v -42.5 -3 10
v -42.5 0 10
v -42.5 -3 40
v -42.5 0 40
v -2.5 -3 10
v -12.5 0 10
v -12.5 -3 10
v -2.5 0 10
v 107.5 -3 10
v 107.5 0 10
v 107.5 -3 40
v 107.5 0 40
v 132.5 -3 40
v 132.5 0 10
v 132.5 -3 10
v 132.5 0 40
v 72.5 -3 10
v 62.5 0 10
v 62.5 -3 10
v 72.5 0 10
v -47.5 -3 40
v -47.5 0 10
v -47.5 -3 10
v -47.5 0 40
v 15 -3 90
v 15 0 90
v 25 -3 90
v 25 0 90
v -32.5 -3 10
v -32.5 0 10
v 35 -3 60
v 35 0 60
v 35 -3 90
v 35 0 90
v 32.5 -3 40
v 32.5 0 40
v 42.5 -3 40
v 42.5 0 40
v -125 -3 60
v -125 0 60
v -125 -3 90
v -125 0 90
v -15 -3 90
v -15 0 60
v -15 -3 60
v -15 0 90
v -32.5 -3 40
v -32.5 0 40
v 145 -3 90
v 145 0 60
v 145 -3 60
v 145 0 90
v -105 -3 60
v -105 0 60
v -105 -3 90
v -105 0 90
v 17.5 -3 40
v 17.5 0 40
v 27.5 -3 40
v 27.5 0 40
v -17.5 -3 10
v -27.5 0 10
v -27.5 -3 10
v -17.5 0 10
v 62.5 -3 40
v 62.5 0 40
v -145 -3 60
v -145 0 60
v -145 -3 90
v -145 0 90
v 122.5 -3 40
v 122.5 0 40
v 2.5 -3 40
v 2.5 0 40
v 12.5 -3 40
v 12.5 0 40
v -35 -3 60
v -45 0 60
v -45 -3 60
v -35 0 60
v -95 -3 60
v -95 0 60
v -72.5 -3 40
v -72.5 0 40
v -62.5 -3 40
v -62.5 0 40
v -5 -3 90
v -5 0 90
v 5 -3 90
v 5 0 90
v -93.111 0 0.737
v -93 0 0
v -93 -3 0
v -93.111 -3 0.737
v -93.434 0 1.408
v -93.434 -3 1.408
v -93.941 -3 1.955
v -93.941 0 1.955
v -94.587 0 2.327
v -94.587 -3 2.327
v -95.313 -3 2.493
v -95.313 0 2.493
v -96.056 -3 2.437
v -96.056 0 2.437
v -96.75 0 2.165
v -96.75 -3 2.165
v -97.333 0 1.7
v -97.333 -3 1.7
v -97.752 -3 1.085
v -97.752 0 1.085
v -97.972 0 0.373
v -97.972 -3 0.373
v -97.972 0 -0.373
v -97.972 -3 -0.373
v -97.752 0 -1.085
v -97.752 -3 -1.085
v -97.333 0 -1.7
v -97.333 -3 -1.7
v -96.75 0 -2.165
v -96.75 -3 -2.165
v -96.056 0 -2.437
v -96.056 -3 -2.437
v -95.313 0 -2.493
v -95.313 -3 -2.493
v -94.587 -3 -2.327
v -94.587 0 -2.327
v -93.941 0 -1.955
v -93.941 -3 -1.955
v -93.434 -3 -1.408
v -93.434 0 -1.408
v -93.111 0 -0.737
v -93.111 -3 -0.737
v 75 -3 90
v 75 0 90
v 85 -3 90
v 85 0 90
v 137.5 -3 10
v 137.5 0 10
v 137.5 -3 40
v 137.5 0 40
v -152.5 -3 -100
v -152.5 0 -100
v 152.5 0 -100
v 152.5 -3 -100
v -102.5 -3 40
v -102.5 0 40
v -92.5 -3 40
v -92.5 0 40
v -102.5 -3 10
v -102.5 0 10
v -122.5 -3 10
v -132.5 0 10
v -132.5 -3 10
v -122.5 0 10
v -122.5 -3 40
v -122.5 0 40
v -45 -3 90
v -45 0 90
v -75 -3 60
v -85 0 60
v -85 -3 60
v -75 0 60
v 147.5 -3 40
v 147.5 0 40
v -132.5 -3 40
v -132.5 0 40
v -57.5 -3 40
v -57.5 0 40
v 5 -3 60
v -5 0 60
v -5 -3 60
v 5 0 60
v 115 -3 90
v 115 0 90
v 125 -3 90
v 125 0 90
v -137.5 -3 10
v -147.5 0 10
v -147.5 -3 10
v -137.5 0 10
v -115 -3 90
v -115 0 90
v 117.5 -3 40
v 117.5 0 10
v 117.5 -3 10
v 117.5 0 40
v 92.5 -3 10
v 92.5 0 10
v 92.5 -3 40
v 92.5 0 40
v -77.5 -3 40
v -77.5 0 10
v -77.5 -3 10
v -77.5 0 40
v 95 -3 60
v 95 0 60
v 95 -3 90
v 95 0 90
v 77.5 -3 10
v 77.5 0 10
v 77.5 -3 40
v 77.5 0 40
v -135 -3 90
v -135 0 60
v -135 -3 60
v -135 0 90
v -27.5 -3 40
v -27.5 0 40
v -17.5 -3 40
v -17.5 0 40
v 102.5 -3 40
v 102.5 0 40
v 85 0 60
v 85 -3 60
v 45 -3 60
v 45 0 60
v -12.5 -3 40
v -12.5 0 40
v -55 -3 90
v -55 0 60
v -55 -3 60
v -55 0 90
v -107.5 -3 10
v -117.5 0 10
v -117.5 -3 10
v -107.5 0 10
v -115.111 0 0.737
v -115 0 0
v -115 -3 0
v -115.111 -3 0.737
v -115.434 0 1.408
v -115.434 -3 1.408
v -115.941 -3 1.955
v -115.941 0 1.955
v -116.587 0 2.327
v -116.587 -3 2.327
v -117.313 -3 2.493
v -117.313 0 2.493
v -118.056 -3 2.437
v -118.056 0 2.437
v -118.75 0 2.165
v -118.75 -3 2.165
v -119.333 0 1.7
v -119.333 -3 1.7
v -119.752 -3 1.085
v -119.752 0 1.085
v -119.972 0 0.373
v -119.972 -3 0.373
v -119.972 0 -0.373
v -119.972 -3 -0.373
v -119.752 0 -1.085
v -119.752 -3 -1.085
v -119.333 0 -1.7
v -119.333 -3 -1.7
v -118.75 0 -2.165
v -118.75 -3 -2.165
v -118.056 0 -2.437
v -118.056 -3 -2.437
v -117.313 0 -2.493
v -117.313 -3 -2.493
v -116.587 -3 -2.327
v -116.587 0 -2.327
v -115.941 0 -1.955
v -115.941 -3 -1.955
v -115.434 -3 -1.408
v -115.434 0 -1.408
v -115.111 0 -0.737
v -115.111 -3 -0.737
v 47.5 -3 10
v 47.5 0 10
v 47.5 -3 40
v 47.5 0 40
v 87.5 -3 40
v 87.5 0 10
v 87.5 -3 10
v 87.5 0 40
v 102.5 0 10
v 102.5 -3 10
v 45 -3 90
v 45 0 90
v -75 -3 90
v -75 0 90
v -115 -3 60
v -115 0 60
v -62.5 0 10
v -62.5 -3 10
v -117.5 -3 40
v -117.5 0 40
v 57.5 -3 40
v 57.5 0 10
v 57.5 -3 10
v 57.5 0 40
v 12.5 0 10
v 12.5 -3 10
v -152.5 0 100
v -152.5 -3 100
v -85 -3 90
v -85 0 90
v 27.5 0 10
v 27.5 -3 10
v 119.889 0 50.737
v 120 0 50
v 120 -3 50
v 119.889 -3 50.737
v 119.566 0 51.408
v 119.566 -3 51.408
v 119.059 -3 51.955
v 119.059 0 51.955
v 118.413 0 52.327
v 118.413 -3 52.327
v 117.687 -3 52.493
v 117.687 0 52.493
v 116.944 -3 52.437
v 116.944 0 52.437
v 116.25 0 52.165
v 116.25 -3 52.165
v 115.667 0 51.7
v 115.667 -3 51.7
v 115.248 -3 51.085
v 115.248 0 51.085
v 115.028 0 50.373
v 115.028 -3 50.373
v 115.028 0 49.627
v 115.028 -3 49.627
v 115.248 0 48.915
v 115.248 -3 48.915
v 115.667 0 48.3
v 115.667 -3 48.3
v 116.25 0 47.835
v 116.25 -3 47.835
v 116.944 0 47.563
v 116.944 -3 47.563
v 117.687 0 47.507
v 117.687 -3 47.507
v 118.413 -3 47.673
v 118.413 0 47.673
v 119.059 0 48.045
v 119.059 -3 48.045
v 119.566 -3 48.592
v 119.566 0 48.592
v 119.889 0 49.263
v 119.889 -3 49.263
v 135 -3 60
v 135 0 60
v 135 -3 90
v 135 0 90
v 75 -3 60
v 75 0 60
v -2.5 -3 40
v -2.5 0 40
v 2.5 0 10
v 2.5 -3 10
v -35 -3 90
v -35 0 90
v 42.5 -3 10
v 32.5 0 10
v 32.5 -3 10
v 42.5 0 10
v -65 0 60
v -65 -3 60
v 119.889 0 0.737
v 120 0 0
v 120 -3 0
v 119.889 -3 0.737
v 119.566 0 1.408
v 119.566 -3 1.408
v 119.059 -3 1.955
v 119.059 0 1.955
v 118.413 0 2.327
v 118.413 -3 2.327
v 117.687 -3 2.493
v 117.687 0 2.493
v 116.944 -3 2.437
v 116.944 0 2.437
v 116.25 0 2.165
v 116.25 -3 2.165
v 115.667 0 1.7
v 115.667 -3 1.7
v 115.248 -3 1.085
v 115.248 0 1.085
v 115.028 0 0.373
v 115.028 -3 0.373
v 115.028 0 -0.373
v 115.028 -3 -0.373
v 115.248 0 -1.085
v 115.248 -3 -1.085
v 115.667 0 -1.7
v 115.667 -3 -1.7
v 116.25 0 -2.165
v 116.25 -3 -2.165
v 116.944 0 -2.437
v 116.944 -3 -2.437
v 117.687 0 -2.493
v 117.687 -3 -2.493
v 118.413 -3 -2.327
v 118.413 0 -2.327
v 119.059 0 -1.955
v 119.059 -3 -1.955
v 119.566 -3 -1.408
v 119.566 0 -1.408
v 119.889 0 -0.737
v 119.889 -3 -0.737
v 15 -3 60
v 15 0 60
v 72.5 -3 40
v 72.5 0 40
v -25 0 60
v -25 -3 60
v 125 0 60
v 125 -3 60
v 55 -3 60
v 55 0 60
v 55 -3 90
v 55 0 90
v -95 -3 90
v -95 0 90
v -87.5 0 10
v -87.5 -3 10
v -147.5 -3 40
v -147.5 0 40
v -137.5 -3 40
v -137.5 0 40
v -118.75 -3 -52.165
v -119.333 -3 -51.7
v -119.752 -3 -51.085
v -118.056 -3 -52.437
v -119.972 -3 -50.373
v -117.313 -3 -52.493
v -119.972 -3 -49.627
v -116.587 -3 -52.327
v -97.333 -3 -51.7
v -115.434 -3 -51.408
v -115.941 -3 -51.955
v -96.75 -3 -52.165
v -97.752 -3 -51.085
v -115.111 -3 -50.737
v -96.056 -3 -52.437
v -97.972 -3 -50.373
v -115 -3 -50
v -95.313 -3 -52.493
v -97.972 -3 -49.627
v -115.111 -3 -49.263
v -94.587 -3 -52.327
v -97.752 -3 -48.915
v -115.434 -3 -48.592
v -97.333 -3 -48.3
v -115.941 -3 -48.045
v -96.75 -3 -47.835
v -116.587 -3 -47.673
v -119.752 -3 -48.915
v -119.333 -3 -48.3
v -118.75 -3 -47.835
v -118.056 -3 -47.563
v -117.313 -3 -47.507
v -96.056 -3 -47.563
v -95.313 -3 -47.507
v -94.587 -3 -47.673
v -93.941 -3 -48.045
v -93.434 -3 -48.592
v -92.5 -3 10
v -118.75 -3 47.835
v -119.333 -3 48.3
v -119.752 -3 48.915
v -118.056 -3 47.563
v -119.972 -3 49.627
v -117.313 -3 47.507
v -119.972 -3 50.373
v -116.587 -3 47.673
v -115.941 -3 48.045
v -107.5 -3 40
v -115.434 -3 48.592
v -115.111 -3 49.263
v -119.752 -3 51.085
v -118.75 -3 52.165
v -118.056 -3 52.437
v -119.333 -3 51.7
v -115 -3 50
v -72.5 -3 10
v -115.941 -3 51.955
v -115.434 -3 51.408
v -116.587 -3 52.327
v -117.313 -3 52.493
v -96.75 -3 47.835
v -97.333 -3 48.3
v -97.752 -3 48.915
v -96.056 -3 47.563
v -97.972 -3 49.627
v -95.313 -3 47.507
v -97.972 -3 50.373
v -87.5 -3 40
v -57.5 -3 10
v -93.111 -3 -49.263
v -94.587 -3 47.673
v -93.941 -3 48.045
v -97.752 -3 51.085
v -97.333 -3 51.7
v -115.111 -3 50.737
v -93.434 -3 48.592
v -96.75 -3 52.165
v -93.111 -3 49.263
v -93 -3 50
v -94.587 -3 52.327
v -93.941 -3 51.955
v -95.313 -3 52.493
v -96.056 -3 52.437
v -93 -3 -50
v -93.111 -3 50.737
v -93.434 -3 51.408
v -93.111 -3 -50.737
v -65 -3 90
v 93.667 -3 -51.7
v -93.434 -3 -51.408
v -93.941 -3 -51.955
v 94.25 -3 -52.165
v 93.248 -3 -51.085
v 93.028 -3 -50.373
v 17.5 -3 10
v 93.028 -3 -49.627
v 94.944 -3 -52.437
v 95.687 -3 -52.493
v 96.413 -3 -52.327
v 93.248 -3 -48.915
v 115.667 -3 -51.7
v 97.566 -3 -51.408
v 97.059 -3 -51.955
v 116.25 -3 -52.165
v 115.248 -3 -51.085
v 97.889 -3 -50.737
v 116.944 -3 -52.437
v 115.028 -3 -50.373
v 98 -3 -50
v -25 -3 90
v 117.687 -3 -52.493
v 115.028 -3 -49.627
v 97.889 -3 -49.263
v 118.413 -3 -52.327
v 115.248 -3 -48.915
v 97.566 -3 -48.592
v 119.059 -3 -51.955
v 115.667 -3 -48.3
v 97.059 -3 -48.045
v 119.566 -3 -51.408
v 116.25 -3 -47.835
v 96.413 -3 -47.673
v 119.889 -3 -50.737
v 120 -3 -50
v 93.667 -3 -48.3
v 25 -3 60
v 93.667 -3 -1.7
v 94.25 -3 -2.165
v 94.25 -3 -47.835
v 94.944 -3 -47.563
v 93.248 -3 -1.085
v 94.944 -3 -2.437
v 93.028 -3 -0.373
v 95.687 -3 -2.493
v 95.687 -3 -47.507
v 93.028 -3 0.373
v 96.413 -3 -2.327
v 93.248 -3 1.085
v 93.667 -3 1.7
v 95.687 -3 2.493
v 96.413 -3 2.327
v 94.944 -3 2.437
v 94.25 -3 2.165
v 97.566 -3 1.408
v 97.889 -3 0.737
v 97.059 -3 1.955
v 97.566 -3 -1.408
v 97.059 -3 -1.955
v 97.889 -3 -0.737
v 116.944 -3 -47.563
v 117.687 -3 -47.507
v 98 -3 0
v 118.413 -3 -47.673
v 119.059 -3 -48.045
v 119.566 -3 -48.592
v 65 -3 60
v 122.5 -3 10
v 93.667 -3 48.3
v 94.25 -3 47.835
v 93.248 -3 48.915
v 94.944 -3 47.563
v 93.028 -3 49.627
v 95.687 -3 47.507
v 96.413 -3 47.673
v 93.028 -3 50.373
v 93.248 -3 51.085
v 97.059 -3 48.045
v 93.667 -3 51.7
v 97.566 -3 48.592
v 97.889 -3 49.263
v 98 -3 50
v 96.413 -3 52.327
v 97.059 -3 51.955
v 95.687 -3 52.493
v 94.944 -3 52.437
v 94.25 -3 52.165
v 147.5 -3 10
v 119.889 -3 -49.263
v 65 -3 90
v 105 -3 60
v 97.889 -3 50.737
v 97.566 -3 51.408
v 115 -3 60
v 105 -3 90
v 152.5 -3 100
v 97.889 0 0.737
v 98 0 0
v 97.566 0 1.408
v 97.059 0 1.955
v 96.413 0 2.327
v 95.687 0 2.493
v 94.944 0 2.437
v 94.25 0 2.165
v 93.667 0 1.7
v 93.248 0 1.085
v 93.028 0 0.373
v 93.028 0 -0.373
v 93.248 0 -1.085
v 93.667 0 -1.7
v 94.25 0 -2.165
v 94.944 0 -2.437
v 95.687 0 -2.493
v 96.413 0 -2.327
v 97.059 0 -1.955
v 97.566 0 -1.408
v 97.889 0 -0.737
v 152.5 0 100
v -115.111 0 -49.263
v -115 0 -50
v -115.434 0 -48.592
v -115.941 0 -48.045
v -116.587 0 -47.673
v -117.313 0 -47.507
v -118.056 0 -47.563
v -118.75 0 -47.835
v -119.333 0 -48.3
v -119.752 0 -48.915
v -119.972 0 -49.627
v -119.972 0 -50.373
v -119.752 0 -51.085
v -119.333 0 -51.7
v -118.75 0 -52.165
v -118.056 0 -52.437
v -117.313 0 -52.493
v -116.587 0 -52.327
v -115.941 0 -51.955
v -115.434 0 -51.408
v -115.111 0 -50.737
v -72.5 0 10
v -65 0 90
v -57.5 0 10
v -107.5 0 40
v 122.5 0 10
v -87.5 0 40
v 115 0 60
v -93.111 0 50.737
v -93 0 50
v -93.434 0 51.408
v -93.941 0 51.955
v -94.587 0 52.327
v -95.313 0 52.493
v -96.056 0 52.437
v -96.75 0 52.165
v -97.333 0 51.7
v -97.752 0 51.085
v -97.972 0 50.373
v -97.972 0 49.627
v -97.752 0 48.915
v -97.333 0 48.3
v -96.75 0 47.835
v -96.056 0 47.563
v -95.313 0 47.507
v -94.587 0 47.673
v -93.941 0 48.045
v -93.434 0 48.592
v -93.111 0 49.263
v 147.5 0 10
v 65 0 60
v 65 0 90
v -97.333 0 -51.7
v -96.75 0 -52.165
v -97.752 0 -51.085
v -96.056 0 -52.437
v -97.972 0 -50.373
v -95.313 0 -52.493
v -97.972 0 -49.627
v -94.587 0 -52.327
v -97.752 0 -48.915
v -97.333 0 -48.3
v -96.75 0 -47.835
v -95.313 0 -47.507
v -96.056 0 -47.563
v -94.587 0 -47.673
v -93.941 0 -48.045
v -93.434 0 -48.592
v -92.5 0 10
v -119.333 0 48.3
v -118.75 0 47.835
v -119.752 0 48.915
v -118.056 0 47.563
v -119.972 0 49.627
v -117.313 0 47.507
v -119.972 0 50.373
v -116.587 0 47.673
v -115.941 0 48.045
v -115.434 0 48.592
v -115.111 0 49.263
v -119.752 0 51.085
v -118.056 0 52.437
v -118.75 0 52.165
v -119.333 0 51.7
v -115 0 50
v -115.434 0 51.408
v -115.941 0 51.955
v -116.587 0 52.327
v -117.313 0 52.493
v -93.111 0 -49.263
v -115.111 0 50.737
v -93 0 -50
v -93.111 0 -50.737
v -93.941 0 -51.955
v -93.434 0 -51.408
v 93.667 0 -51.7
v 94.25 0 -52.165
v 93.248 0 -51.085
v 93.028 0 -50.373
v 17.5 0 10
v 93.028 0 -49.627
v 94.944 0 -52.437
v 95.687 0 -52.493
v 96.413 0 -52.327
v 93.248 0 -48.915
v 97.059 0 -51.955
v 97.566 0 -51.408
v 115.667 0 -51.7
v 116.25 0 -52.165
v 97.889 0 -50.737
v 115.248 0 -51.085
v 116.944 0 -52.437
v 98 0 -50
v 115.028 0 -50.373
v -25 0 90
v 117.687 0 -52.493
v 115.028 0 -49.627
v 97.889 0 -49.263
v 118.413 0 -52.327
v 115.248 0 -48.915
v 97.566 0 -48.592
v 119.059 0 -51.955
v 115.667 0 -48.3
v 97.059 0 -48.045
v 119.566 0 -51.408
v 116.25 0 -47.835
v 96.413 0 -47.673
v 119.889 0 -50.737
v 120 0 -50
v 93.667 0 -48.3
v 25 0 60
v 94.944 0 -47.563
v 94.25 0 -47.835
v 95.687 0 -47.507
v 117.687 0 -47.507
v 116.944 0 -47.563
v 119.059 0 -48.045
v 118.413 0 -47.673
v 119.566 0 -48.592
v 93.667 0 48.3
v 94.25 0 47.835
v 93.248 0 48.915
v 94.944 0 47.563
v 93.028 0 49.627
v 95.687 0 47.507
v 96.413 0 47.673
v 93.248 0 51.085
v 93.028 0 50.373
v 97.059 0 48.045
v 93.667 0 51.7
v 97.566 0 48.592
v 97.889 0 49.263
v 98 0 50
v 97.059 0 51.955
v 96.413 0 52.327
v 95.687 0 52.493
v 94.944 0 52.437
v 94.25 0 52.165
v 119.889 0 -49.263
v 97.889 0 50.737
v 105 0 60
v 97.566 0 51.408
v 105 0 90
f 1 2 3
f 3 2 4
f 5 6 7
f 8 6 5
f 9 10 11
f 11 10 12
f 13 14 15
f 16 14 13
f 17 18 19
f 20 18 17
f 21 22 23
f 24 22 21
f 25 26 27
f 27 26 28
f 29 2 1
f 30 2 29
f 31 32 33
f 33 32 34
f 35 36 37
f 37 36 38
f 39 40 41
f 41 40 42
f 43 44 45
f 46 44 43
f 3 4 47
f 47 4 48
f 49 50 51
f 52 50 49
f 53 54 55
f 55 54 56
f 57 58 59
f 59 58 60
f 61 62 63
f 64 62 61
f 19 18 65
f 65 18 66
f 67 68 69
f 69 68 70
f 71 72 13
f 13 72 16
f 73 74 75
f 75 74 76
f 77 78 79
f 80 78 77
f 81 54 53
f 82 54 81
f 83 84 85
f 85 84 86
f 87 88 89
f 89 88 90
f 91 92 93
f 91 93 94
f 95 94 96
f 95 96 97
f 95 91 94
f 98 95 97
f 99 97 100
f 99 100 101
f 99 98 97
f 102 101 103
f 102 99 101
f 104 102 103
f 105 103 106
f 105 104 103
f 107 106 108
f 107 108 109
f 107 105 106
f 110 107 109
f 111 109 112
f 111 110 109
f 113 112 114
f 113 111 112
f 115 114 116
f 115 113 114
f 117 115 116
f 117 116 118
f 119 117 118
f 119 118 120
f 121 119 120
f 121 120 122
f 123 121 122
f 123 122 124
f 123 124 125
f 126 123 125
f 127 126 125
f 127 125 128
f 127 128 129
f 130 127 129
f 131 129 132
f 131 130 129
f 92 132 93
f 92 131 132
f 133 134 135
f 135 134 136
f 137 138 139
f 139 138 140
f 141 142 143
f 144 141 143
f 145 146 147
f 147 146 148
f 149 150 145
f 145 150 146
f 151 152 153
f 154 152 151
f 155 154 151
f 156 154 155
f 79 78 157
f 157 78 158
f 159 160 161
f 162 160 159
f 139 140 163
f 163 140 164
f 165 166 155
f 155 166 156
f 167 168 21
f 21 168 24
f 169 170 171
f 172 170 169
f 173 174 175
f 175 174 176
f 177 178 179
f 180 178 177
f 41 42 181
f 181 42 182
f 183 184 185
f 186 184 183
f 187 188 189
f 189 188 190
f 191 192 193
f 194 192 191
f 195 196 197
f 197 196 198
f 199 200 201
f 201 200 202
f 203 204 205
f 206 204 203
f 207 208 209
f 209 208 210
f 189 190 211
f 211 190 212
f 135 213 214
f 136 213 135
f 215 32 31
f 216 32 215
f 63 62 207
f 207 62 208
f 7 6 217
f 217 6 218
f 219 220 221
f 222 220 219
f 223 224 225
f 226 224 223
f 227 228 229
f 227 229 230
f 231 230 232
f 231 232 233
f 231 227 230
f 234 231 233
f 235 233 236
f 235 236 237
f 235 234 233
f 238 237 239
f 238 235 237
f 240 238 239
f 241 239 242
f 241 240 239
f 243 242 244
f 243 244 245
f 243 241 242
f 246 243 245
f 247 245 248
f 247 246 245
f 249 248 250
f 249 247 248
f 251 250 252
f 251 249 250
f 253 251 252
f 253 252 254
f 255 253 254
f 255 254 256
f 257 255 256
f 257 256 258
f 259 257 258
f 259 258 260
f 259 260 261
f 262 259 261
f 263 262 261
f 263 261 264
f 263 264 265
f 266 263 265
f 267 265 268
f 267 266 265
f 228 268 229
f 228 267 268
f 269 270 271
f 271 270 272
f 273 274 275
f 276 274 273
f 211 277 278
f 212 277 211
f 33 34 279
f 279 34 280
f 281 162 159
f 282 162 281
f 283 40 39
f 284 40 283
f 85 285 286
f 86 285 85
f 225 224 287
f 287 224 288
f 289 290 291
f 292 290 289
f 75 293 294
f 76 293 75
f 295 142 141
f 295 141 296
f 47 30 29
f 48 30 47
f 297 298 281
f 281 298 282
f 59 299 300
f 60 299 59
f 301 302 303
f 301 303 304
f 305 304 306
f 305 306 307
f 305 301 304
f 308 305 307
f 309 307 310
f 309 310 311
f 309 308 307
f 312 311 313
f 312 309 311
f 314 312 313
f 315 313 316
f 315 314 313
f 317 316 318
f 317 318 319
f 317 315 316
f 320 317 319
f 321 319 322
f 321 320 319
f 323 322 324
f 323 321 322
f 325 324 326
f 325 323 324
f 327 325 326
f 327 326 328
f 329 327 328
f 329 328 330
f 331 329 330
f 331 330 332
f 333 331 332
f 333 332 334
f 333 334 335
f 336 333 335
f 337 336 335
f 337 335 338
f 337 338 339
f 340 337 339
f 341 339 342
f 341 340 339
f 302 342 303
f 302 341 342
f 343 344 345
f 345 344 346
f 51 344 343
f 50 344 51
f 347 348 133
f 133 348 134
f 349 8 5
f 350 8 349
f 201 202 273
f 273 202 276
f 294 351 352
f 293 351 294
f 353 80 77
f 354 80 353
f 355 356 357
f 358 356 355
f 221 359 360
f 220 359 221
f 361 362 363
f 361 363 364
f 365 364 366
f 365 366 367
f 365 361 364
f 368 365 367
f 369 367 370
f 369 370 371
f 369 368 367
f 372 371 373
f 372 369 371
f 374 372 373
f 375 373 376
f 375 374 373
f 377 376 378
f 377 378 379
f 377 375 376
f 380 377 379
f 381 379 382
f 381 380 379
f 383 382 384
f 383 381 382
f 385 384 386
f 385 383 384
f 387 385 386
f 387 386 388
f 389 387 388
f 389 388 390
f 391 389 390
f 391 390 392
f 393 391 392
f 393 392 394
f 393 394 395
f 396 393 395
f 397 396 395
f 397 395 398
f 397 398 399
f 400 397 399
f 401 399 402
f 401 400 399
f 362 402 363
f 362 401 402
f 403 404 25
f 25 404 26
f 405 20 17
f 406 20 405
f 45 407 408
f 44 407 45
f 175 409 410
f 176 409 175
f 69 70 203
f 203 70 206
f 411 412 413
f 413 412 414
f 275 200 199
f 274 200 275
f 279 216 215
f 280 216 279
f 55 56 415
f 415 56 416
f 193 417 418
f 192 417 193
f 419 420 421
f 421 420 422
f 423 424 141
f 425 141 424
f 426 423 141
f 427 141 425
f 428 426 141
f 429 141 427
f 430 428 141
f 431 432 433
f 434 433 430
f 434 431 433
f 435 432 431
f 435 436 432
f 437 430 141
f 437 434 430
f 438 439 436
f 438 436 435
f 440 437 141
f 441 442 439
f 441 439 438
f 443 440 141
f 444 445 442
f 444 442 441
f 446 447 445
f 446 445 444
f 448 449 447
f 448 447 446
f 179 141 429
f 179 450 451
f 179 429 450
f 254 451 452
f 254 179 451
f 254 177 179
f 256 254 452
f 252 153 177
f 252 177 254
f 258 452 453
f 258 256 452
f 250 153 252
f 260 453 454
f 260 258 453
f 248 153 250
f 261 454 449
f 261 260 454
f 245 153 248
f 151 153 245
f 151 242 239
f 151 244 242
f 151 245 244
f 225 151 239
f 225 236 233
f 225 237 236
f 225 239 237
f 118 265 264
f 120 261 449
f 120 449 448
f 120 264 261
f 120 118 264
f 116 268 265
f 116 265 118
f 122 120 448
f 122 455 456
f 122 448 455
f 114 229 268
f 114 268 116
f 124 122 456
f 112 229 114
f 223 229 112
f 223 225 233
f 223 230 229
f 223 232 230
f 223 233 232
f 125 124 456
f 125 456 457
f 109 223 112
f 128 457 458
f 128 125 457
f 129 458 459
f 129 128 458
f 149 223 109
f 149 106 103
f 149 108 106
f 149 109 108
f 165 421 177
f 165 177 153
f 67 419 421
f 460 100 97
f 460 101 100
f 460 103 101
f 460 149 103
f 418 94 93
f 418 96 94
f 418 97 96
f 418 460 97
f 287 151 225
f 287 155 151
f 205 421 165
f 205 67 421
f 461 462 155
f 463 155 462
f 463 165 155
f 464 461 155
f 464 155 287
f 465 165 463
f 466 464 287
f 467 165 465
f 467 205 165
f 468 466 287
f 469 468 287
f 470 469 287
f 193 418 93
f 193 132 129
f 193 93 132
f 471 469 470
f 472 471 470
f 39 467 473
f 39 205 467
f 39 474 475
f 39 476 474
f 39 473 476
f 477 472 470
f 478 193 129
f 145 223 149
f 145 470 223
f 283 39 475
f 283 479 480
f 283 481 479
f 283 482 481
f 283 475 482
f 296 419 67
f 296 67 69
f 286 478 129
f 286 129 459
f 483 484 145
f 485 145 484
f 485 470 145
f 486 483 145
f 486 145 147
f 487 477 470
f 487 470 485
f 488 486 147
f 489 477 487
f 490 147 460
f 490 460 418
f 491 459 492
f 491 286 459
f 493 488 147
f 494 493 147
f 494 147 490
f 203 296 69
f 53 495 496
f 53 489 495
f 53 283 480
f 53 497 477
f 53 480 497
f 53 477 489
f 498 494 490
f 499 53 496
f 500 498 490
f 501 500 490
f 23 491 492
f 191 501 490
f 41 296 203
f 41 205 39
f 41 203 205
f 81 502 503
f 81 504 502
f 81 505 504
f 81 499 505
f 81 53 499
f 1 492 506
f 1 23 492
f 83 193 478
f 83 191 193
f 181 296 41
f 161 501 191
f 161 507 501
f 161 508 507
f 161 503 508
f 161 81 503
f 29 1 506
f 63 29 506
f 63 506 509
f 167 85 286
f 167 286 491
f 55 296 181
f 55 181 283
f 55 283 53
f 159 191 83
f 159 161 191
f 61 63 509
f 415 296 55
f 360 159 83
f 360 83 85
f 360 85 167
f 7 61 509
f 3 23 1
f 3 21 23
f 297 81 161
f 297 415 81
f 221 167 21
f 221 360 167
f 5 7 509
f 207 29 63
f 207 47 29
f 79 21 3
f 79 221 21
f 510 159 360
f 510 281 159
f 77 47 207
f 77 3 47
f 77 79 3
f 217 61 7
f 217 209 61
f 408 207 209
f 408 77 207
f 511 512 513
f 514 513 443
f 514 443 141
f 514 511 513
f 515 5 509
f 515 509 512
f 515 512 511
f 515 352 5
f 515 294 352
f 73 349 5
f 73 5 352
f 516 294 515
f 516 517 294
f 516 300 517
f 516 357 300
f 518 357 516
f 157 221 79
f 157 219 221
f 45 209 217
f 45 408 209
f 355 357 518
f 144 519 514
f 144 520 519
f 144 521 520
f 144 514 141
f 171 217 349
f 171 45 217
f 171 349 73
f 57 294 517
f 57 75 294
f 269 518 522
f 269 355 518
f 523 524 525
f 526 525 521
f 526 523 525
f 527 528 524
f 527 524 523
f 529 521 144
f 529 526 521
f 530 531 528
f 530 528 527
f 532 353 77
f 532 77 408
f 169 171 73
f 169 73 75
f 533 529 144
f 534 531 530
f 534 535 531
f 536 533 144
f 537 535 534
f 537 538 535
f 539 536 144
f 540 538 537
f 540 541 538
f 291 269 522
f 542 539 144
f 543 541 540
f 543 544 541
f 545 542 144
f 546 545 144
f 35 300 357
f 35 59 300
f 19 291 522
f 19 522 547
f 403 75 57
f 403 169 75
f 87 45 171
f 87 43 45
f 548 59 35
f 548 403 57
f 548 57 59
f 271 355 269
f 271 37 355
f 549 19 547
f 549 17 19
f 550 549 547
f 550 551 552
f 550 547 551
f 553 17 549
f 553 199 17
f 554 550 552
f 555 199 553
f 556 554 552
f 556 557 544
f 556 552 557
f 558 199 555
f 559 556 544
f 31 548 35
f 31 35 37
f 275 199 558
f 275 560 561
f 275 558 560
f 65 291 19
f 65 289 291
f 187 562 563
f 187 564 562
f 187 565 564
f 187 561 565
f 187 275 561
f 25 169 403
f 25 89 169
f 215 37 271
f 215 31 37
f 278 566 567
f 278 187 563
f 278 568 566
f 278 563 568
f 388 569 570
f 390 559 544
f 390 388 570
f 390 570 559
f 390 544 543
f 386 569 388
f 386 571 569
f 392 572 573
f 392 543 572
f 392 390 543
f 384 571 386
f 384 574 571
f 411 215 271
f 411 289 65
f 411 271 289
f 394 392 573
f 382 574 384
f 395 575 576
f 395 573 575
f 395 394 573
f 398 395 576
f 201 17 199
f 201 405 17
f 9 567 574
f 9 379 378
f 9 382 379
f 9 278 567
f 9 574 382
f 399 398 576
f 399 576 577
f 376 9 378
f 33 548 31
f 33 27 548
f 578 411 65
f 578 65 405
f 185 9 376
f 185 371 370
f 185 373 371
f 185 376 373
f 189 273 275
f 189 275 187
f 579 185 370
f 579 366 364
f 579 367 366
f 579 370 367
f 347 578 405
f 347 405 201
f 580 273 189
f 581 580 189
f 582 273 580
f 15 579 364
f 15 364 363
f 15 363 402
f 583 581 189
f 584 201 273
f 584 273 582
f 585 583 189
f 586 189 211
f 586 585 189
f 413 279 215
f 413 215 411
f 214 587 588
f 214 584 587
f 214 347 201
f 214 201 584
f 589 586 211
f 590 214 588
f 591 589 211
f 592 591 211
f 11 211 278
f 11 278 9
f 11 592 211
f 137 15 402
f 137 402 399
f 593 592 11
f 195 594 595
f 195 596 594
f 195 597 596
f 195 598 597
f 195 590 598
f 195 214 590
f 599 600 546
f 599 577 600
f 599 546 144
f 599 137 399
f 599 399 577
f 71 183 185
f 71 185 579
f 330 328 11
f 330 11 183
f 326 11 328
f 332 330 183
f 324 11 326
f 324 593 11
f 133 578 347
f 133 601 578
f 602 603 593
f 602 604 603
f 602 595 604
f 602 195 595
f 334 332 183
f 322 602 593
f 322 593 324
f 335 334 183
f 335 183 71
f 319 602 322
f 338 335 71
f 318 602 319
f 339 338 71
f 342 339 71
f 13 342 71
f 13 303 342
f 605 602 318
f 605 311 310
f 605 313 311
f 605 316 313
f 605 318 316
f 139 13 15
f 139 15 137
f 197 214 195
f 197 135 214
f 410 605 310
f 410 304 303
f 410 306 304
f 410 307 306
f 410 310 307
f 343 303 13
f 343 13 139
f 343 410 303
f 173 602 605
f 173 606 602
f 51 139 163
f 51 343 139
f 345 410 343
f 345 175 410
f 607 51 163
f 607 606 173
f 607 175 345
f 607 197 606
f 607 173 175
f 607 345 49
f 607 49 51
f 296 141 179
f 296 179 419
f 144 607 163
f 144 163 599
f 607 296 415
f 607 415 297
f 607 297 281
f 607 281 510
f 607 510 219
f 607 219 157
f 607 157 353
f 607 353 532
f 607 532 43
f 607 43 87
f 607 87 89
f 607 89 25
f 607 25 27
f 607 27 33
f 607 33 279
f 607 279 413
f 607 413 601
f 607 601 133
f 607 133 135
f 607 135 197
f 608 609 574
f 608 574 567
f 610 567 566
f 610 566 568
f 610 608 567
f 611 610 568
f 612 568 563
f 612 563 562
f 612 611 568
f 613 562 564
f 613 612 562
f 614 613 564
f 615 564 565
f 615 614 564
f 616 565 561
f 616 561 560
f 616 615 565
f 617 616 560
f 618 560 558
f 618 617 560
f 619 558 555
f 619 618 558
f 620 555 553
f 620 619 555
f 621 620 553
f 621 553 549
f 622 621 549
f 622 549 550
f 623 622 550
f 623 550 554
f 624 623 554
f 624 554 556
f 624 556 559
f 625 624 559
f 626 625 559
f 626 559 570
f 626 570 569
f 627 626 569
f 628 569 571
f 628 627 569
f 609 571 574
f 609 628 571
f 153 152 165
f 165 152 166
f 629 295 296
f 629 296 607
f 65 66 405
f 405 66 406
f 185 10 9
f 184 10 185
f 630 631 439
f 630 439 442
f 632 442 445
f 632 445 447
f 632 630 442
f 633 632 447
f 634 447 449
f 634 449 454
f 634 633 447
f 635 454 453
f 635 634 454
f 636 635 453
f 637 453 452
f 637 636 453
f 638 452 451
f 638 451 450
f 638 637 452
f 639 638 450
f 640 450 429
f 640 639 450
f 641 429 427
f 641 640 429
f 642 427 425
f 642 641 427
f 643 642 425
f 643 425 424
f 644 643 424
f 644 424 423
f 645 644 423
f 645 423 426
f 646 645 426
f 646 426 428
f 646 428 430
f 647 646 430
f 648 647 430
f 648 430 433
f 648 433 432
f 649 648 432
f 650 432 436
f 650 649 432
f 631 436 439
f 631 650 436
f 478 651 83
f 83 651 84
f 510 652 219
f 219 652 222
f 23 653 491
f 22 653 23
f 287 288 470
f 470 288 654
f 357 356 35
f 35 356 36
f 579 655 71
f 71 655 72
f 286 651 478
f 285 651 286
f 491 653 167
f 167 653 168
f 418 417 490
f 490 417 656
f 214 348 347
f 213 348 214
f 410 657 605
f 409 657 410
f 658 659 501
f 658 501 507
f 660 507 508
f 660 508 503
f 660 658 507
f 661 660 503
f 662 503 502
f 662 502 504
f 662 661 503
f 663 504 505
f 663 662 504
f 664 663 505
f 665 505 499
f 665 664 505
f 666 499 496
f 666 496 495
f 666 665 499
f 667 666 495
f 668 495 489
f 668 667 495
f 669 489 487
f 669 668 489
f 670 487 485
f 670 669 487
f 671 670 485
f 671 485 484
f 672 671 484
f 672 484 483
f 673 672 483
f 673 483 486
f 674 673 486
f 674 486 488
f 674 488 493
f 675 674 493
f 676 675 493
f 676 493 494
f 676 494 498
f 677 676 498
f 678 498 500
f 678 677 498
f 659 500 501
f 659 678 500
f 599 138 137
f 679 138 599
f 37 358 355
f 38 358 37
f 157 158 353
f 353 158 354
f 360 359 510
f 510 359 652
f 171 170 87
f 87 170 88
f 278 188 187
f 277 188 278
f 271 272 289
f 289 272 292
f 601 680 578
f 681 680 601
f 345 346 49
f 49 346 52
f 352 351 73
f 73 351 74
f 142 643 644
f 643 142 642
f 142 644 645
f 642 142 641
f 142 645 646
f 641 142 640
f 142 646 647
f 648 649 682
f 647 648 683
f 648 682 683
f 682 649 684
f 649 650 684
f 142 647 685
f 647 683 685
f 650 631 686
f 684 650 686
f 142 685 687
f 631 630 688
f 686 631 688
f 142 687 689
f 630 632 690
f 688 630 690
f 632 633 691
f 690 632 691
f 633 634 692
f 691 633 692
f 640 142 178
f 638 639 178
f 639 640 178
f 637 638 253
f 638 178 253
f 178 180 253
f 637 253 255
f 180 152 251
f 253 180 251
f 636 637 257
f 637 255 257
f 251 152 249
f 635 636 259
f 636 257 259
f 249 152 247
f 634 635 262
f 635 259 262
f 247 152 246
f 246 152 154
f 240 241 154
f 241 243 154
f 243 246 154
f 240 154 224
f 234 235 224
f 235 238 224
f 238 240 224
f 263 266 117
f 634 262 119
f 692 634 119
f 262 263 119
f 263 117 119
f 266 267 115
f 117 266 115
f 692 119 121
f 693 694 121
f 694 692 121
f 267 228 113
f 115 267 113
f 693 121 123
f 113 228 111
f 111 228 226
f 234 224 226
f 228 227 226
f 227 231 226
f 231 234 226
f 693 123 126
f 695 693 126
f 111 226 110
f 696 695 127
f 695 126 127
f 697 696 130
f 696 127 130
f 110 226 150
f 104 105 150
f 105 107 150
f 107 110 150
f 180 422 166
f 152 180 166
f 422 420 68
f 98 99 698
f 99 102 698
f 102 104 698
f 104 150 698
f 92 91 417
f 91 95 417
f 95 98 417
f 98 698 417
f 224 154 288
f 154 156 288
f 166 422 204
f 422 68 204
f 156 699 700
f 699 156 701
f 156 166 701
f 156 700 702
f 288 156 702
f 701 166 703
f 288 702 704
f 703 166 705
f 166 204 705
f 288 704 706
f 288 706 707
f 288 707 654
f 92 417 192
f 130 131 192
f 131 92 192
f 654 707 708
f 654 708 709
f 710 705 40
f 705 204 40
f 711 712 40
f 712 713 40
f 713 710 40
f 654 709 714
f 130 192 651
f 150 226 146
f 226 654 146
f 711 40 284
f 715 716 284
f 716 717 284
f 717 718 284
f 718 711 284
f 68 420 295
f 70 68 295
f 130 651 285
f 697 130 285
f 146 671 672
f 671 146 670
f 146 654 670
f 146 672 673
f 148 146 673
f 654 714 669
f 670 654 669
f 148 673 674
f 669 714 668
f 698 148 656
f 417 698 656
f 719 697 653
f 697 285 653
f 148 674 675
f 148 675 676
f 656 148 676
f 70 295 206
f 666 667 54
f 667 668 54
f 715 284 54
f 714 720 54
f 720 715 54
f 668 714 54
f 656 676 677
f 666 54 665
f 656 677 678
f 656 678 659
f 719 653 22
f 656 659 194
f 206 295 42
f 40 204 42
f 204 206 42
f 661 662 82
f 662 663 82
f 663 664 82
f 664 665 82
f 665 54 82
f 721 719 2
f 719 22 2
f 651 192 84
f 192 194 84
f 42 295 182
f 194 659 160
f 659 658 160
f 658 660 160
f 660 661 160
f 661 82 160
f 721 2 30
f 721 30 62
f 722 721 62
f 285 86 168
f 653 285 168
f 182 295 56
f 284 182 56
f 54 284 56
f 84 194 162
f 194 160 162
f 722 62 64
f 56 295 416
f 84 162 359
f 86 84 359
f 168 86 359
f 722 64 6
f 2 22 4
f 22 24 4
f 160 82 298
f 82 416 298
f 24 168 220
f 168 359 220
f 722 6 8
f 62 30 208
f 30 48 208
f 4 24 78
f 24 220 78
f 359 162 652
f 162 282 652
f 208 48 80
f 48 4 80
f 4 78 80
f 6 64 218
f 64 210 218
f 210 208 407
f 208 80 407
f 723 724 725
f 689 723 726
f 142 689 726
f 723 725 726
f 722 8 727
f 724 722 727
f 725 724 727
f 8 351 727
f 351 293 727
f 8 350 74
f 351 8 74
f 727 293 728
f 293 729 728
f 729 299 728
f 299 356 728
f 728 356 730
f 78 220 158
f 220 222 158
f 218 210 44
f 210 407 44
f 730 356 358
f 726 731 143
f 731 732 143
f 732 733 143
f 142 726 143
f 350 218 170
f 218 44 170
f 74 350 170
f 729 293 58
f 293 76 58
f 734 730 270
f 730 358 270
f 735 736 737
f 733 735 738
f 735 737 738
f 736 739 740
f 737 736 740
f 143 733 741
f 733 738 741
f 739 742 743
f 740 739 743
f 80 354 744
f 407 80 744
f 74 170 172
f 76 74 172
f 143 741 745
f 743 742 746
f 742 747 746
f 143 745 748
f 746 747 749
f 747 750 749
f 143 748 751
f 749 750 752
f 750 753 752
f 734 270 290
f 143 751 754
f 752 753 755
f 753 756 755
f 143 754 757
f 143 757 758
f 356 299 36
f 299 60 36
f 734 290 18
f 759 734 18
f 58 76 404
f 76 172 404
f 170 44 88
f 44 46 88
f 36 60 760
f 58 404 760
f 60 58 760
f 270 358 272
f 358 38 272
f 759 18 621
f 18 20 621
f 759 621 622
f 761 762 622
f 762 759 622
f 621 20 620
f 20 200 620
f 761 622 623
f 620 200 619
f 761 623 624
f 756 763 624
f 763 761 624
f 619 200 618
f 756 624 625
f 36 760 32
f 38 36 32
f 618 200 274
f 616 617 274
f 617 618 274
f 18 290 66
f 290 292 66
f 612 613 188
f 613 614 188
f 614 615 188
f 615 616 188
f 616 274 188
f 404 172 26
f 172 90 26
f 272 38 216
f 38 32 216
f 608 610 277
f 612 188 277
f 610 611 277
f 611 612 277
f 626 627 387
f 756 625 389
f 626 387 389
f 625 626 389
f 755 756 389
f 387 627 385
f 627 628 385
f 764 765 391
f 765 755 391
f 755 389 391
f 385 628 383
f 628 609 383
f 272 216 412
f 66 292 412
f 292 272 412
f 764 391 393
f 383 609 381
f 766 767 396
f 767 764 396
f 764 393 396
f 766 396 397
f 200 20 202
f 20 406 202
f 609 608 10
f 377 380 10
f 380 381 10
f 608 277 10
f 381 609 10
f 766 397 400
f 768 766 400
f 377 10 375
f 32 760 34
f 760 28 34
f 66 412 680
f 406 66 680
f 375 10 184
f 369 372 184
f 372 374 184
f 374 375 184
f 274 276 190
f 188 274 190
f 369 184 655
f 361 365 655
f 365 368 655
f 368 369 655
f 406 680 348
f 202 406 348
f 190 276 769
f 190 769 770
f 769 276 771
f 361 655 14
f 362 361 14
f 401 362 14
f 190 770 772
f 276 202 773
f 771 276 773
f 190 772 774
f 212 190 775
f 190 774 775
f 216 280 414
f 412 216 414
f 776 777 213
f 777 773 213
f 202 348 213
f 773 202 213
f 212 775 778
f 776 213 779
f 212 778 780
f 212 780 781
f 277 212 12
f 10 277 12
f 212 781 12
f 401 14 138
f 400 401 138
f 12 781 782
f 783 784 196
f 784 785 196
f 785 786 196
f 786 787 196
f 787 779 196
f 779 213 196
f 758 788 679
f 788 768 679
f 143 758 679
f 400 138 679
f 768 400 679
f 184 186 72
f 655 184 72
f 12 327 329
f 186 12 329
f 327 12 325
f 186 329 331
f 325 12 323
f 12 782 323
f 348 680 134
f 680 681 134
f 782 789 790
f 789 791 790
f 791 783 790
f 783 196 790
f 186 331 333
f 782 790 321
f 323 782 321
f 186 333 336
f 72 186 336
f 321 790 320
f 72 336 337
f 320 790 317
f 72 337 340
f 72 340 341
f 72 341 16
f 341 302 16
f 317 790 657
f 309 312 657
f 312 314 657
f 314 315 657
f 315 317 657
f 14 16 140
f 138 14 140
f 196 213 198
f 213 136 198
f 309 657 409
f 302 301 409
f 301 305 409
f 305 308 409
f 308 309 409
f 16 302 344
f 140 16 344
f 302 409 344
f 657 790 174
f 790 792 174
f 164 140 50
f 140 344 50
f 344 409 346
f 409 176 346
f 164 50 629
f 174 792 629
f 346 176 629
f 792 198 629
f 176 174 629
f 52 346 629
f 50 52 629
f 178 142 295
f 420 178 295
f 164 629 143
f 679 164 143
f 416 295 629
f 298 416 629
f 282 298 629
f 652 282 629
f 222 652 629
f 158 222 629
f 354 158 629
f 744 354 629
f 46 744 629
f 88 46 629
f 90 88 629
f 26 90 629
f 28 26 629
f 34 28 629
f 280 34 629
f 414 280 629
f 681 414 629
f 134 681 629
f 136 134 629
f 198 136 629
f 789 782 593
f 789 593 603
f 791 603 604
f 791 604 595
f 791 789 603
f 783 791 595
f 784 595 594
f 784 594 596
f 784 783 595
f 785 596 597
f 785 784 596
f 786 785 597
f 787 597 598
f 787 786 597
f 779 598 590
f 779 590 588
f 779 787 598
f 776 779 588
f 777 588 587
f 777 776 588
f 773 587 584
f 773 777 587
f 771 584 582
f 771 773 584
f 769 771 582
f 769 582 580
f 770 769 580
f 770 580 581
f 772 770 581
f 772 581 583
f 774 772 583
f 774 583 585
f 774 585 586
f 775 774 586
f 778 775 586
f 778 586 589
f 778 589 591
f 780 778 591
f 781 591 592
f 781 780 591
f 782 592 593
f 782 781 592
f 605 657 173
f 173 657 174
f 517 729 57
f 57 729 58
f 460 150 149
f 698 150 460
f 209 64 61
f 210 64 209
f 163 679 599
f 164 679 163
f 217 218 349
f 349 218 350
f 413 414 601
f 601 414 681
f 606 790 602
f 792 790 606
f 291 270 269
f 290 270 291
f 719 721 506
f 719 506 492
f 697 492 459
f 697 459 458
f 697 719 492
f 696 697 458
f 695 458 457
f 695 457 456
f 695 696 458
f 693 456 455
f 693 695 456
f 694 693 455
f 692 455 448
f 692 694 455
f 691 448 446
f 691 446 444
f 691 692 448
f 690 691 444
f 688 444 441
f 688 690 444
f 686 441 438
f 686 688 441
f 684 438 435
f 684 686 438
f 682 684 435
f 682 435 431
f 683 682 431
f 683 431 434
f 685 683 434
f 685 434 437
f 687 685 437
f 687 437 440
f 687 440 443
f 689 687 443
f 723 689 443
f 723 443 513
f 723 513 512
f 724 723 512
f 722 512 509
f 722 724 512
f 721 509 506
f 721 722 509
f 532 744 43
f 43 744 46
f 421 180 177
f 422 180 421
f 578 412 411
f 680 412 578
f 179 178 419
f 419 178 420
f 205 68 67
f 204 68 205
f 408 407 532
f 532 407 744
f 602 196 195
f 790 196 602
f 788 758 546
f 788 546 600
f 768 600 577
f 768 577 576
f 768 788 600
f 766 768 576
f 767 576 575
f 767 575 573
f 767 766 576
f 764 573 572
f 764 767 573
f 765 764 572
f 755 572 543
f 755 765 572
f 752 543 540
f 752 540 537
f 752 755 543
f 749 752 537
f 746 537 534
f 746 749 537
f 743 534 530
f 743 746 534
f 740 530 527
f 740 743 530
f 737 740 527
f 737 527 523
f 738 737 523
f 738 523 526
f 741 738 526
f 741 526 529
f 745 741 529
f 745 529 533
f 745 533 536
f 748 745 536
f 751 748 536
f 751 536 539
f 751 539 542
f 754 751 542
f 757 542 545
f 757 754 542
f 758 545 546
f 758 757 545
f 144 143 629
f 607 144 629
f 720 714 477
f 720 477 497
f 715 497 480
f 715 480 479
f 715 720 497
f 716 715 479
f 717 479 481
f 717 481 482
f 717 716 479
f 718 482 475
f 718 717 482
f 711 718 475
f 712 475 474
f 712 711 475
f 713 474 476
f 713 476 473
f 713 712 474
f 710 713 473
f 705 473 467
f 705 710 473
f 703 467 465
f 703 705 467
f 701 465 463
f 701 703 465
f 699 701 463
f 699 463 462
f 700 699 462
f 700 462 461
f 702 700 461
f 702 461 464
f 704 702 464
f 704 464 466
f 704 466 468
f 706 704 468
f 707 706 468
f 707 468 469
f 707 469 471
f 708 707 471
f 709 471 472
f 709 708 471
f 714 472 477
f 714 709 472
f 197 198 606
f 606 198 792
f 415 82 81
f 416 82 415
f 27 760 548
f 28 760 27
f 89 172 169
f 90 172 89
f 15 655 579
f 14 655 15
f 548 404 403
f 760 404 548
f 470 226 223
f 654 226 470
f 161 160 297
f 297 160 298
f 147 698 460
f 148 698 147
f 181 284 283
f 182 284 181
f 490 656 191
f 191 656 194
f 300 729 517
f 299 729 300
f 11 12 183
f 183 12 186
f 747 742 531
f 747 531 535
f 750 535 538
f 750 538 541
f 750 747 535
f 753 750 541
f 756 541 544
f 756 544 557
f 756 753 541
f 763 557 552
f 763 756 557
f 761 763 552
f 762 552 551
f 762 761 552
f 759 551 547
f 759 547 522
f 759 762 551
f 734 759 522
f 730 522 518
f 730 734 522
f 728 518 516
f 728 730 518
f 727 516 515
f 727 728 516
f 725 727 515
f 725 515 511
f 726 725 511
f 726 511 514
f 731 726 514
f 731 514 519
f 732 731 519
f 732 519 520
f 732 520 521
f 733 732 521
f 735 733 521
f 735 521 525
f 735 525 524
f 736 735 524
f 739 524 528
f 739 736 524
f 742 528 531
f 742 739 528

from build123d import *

# Parameters (mm, degrees)
F0_W     = 305
F0_H     = 200
F0_R     = 2.5
F0_W_2   = 10
F0_H_2   = 30
F1_DEPTH = 3


with BuildPart() as f1:
    # F0 (on Front) → F1 (new body)
    with BuildSketch(Plane.XZ):
        Rectangle(F0_W, F0_H)
        with Locations((-117.5, -50)):
            Circle(F0_R, mode=Mode.SUBTRACT)
        with Locations((-95.5, -50)):
            Circle(F0_R, mode=Mode.SUBTRACT)
        with Locations((95.5, -50)):
            Circle(F0_R, mode=Mode.SUBTRACT)
        with Locations((117.5, -50)):
            Circle(F0_R, mode=Mode.SUBTRACT)
        with Locations((-117.5, 0)):
            Circle(F0_R, mode=Mode.SUBTRACT)
        with Locations((-95.5, 0)):
            Circle(F0_R, mode=Mode.SUBTRACT)
        with Locations((-142.5, 25)):
            Rectangle(F0_W_2, F0_H_2, mode=Mode.SUBTRACT)
        with Locations((-127.5, 25)):
            Rectangle(F0_W_2, F0_H_2, mode=Mode.SUBTRACT)
        with Locations((-112.5, 25)):
            Rectangle(F0_W_2, F0_H_2, mode=Mode.SUBTRACT)
        with Locations((-97.5, 25)):
            Rectangle(F0_W_2, F0_H_2, mode=Mode.SUBTRACT)
        with Locations((-82.5, 25)):
            Rectangle(F0_W_2, F0_H_2, mode=Mode.SUBTRACT)
        with Locations((-67.5, 25)):
            Rectangle(F0_W_2, F0_H_2, mode=Mode.SUBTRACT)
        with Locations((-52.5, 25)):
            Rectangle(F0_W_2, F0_H_2, mode=Mode.SUBTRACT)
        with Locations((-37.5, 25)):
            Rectangle(F0_W_2, F0_H_2, mode=Mode.SUBTRACT)
        with Locations((-22.5, 25)):
            Rectangle(F0_W_2, F0_H_2, mode=Mode.SUBTRACT)
        with Locations((-7.5, 25)):
            Rectangle(F0_W_2, F0_H_2, mode=Mode.SUBTRACT)
        with Locations((-117.5, 50)):
            Circle(F0_R, mode=Mode.SUBTRACT)
        with Locations((-95.5, 50)):
            Circle(F0_R, mode=Mode.SUBTRACT)
        with Locations((-140, 75)):
            Rectangle(F0_W_2, F0_H_2, mode=Mode.SUBTRACT)
        with Locations((-120, 75)):
            Rectangle(F0_W_2, F0_H_2, mode=Mode.SUBTRACT)
        with Locations((-100, 75)):
            Rectangle(F0_W_2, F0_H_2, mode=Mode.SUBTRACT)
        with Locations((-80, 75)):
            Rectangle(F0_W_2, F0_H_2, mode=Mode.SUBTRACT)
        with Locations((-60, 75)):
            Rectangle(F0_W_2, F0_H_2, mode=Mode.SUBTRACT)
        with Locations((-40, 75)):
            Rectangle(F0_W_2, F0_H_2, mode=Mode.SUBTRACT)
        with Locations((-20, 75)):
            Rectangle(F0_W_2, F0_H_2, mode=Mode.SUBTRACT)
        with Locations((7.5, 25)):
            Rectangle(F0_W_2, F0_H_2, mode=Mode.SUBTRACT)
        with Locations((22.5, 25)):
            Rectangle(F0_W_2, F0_H_2, mode=Mode.SUBTRACT)
        with Locations((37.5, 25)):
            Rectangle(F0_W_2, F0_H_2, mode=Mode.SUBTRACT)
        with Locations((52.5, 25)):
            Rectangle(F0_W_2, F0_H_2, mode=Mode.SUBTRACT)
        with Locations((67.5, 25)):
            Rectangle(F0_W_2, F0_H_2, mode=Mode.SUBTRACT)
        with Locations((95.5, 0)):
            Circle(F0_R, mode=Mode.SUBTRACT)
        with Locations((117.5, 0)):
            Circle(F0_R, mode=Mode.SUBTRACT)
        with Locations((82.5, 25)):
            Rectangle(F0_W_2, F0_H_2, mode=Mode.SUBTRACT)
        with Locations((97.5, 25)):
            Rectangle(F0_W_2, F0_H_2, mode=Mode.SUBTRACT)
        with Locations((112.5, 25)):
            Rectangle(F0_W_2, F0_H_2, mode=Mode.SUBTRACT)
        with Locations((127.5, 25)):
            Rectangle(F0_W_2, F0_H_2, mode=Mode.SUBTRACT)
        with Locations((142.5, 25)):
            Rectangle(F0_W_2, F0_H_2, mode=Mode.SUBTRACT)
        with Locations((0, 75)):
            Rectangle(F0_W_2, F0_H_2, mode=Mode.SUBTRACT)
        with Locations((20, 75)):
            Rectangle(F0_W_2, F0_H_2, mode=Mode.SUBTRACT)
        with Locations((40, 75)):
            Rectangle(F0_W_2, F0_H_2, mode=Mode.SUBTRACT)
        with Locations((60, 75)):
            Rectangle(F0_W_2, F0_H_2, mode=Mode.SUBTRACT)
        with Locations((95.5, 50)):
            Circle(F0_R, mode=Mode.SUBTRACT)
        with Locations((117.5, 50)):
            Circle(F0_R, mode=Mode.SUBTRACT)
        with Locations((80, 75)):
            Rectangle(F0_W_2, F0_H_2, mode=Mode.SUBTRACT)
        with Locations((100, 75)):
            Rectangle(F0_W_2, F0_H_2, mode=Mode.SUBTRACT)
        with Locations((120, 75)):
            Rectangle(F0_W_2, F0_H_2, mode=Mode.SUBTRACT)
        with Locations((140, 75)):
            Rectangle(F0_W_2, F0_H_2, mode=Mode.SUBTRACT)
    extrude(amount=F1_DEPTH)


solid = f1.part
